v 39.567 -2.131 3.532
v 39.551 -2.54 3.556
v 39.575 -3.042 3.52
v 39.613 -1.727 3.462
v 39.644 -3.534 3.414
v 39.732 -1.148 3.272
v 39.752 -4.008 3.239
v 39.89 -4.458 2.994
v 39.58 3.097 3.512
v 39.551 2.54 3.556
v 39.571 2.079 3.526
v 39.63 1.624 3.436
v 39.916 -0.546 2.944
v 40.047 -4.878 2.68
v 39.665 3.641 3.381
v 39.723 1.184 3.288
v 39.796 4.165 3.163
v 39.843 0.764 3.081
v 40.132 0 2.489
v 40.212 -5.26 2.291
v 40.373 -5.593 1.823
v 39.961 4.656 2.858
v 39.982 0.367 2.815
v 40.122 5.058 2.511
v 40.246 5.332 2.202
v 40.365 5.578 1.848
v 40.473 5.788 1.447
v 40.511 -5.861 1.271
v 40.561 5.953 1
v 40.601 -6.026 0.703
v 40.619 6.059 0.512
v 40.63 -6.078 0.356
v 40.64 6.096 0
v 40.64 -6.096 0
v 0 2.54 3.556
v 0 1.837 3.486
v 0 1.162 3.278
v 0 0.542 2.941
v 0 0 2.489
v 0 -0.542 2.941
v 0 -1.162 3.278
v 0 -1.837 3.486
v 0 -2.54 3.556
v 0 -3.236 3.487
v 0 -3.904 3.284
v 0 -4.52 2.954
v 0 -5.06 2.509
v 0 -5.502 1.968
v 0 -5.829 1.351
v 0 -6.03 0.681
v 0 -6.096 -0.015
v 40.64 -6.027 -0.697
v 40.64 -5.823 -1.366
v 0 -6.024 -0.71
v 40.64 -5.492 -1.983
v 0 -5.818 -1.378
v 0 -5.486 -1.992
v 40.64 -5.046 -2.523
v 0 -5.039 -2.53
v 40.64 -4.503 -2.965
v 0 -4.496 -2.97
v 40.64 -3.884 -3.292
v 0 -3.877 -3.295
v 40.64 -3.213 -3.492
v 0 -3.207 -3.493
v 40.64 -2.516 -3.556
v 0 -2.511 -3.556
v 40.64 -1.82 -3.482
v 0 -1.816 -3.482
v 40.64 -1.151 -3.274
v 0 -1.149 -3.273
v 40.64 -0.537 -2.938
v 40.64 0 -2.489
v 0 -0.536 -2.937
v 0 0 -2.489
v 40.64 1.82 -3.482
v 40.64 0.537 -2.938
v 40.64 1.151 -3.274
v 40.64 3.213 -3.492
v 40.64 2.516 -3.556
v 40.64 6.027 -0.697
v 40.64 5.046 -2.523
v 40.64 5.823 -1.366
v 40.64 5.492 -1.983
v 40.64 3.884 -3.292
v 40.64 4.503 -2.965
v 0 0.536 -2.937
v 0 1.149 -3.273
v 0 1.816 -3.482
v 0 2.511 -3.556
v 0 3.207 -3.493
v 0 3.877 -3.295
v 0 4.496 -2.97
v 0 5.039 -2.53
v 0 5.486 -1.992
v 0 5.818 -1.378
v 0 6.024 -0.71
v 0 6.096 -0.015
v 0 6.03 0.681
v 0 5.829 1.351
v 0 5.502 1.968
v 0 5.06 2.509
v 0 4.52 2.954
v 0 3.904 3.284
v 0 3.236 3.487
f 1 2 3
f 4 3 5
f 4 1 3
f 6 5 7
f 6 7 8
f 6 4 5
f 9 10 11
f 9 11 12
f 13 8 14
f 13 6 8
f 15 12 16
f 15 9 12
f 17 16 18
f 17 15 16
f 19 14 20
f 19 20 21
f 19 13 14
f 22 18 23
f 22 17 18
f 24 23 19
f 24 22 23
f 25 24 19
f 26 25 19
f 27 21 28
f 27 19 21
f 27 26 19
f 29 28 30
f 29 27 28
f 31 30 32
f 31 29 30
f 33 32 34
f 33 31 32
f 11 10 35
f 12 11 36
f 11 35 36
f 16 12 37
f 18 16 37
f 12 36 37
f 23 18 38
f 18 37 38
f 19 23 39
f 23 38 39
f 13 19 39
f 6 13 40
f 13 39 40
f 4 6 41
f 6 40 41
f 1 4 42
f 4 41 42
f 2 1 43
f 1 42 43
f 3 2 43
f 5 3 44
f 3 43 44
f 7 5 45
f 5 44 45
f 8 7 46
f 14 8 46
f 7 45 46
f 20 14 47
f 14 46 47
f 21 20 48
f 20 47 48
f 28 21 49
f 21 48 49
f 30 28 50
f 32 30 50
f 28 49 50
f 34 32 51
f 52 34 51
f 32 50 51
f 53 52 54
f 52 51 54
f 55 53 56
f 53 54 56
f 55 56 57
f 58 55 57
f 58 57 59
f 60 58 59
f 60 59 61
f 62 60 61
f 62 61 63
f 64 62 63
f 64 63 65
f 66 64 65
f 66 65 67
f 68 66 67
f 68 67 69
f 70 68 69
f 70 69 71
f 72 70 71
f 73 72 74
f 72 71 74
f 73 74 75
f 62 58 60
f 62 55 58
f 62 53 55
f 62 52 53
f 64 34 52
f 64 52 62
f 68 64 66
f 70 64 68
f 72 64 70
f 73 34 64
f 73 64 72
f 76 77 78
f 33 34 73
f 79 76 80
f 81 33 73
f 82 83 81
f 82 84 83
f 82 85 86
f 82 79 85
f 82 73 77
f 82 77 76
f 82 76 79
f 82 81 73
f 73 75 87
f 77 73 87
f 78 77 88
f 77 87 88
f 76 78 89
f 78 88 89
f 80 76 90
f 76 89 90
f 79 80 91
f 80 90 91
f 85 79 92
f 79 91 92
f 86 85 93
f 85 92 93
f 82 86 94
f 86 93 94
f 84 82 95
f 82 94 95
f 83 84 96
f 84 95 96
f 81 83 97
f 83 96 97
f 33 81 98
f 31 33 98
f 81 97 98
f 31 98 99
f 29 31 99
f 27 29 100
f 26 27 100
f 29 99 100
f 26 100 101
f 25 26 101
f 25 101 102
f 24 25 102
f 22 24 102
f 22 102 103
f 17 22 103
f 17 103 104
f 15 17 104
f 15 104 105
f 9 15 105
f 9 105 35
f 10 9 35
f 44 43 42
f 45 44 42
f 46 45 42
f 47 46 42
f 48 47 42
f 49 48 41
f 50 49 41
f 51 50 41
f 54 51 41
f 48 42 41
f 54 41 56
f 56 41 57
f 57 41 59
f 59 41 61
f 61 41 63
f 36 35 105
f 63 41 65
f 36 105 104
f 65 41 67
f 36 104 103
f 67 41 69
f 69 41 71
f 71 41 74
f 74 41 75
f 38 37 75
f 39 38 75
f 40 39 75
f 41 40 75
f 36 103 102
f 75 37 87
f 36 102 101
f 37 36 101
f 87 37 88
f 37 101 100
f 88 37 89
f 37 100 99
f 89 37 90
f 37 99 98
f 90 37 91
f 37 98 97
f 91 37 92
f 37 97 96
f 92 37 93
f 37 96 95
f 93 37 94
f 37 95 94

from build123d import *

# Parameters (mm, degrees)
SKETCH2_W           = 12.7
SKETCH2_H           = 12.7
BOSS_EXTRUDE1_DEPTH = 40.64
FILLET1_R           = 6.35
SKETCH3_W           = 12.7
SKETCH3_H           = 12.7
CUT_EXTRUDE2_DEPTH  = 42.620362805


with BuildPart() as part:
    # Sketch2 → Boss-Extrude1 (new body)
    with BuildSketch(Plane(origin=(0, 0, 0), x_dir=(0, 0, -1), z_dir=(1, 0, 0))):
        Rectangle(SKETCH2_W, SKETCH2_H)
    extrude(amount=BOSS_EXTRUDE1_DEPTH)

    # Fillet1
    fillet1_edges = [part.edges().sort_by_distance(p)[0] for p in [
        (40.64, 0, 6.35),
    ]]
    fillet(fillet1_edges, radius=FILLET1_R)

    # Sketch3 → Cut-Extrude2 (cut, through all)
    with BuildSketch(Plane.ZY):
        Rectangle(SKETCH3_W, SKETCH3_H)
        with BuildLine():
            ThreePointArc((2.488681579, 0), (3.278329429, -1.162432523), (3.556, -2.54))
            ThreePointArc((3.556, -2.54), (-1.377567477, -5.818329429), (-2.488681579, 0))
            ThreePointArc((-2.488681579, 0), (-1.377567477, 5.818329429), (3.556, 2.54))
            ThreePointArc((3.556, 2.54), (3.278329429, 1.162432523), (2.488681579, 0))
        make_face(mode=Mode.SUBTRACT)
    extrude(amount=-CUT_EXTRUDE2_DEPTH, mode=Mode.SUBTRACT)


solid = part.part
